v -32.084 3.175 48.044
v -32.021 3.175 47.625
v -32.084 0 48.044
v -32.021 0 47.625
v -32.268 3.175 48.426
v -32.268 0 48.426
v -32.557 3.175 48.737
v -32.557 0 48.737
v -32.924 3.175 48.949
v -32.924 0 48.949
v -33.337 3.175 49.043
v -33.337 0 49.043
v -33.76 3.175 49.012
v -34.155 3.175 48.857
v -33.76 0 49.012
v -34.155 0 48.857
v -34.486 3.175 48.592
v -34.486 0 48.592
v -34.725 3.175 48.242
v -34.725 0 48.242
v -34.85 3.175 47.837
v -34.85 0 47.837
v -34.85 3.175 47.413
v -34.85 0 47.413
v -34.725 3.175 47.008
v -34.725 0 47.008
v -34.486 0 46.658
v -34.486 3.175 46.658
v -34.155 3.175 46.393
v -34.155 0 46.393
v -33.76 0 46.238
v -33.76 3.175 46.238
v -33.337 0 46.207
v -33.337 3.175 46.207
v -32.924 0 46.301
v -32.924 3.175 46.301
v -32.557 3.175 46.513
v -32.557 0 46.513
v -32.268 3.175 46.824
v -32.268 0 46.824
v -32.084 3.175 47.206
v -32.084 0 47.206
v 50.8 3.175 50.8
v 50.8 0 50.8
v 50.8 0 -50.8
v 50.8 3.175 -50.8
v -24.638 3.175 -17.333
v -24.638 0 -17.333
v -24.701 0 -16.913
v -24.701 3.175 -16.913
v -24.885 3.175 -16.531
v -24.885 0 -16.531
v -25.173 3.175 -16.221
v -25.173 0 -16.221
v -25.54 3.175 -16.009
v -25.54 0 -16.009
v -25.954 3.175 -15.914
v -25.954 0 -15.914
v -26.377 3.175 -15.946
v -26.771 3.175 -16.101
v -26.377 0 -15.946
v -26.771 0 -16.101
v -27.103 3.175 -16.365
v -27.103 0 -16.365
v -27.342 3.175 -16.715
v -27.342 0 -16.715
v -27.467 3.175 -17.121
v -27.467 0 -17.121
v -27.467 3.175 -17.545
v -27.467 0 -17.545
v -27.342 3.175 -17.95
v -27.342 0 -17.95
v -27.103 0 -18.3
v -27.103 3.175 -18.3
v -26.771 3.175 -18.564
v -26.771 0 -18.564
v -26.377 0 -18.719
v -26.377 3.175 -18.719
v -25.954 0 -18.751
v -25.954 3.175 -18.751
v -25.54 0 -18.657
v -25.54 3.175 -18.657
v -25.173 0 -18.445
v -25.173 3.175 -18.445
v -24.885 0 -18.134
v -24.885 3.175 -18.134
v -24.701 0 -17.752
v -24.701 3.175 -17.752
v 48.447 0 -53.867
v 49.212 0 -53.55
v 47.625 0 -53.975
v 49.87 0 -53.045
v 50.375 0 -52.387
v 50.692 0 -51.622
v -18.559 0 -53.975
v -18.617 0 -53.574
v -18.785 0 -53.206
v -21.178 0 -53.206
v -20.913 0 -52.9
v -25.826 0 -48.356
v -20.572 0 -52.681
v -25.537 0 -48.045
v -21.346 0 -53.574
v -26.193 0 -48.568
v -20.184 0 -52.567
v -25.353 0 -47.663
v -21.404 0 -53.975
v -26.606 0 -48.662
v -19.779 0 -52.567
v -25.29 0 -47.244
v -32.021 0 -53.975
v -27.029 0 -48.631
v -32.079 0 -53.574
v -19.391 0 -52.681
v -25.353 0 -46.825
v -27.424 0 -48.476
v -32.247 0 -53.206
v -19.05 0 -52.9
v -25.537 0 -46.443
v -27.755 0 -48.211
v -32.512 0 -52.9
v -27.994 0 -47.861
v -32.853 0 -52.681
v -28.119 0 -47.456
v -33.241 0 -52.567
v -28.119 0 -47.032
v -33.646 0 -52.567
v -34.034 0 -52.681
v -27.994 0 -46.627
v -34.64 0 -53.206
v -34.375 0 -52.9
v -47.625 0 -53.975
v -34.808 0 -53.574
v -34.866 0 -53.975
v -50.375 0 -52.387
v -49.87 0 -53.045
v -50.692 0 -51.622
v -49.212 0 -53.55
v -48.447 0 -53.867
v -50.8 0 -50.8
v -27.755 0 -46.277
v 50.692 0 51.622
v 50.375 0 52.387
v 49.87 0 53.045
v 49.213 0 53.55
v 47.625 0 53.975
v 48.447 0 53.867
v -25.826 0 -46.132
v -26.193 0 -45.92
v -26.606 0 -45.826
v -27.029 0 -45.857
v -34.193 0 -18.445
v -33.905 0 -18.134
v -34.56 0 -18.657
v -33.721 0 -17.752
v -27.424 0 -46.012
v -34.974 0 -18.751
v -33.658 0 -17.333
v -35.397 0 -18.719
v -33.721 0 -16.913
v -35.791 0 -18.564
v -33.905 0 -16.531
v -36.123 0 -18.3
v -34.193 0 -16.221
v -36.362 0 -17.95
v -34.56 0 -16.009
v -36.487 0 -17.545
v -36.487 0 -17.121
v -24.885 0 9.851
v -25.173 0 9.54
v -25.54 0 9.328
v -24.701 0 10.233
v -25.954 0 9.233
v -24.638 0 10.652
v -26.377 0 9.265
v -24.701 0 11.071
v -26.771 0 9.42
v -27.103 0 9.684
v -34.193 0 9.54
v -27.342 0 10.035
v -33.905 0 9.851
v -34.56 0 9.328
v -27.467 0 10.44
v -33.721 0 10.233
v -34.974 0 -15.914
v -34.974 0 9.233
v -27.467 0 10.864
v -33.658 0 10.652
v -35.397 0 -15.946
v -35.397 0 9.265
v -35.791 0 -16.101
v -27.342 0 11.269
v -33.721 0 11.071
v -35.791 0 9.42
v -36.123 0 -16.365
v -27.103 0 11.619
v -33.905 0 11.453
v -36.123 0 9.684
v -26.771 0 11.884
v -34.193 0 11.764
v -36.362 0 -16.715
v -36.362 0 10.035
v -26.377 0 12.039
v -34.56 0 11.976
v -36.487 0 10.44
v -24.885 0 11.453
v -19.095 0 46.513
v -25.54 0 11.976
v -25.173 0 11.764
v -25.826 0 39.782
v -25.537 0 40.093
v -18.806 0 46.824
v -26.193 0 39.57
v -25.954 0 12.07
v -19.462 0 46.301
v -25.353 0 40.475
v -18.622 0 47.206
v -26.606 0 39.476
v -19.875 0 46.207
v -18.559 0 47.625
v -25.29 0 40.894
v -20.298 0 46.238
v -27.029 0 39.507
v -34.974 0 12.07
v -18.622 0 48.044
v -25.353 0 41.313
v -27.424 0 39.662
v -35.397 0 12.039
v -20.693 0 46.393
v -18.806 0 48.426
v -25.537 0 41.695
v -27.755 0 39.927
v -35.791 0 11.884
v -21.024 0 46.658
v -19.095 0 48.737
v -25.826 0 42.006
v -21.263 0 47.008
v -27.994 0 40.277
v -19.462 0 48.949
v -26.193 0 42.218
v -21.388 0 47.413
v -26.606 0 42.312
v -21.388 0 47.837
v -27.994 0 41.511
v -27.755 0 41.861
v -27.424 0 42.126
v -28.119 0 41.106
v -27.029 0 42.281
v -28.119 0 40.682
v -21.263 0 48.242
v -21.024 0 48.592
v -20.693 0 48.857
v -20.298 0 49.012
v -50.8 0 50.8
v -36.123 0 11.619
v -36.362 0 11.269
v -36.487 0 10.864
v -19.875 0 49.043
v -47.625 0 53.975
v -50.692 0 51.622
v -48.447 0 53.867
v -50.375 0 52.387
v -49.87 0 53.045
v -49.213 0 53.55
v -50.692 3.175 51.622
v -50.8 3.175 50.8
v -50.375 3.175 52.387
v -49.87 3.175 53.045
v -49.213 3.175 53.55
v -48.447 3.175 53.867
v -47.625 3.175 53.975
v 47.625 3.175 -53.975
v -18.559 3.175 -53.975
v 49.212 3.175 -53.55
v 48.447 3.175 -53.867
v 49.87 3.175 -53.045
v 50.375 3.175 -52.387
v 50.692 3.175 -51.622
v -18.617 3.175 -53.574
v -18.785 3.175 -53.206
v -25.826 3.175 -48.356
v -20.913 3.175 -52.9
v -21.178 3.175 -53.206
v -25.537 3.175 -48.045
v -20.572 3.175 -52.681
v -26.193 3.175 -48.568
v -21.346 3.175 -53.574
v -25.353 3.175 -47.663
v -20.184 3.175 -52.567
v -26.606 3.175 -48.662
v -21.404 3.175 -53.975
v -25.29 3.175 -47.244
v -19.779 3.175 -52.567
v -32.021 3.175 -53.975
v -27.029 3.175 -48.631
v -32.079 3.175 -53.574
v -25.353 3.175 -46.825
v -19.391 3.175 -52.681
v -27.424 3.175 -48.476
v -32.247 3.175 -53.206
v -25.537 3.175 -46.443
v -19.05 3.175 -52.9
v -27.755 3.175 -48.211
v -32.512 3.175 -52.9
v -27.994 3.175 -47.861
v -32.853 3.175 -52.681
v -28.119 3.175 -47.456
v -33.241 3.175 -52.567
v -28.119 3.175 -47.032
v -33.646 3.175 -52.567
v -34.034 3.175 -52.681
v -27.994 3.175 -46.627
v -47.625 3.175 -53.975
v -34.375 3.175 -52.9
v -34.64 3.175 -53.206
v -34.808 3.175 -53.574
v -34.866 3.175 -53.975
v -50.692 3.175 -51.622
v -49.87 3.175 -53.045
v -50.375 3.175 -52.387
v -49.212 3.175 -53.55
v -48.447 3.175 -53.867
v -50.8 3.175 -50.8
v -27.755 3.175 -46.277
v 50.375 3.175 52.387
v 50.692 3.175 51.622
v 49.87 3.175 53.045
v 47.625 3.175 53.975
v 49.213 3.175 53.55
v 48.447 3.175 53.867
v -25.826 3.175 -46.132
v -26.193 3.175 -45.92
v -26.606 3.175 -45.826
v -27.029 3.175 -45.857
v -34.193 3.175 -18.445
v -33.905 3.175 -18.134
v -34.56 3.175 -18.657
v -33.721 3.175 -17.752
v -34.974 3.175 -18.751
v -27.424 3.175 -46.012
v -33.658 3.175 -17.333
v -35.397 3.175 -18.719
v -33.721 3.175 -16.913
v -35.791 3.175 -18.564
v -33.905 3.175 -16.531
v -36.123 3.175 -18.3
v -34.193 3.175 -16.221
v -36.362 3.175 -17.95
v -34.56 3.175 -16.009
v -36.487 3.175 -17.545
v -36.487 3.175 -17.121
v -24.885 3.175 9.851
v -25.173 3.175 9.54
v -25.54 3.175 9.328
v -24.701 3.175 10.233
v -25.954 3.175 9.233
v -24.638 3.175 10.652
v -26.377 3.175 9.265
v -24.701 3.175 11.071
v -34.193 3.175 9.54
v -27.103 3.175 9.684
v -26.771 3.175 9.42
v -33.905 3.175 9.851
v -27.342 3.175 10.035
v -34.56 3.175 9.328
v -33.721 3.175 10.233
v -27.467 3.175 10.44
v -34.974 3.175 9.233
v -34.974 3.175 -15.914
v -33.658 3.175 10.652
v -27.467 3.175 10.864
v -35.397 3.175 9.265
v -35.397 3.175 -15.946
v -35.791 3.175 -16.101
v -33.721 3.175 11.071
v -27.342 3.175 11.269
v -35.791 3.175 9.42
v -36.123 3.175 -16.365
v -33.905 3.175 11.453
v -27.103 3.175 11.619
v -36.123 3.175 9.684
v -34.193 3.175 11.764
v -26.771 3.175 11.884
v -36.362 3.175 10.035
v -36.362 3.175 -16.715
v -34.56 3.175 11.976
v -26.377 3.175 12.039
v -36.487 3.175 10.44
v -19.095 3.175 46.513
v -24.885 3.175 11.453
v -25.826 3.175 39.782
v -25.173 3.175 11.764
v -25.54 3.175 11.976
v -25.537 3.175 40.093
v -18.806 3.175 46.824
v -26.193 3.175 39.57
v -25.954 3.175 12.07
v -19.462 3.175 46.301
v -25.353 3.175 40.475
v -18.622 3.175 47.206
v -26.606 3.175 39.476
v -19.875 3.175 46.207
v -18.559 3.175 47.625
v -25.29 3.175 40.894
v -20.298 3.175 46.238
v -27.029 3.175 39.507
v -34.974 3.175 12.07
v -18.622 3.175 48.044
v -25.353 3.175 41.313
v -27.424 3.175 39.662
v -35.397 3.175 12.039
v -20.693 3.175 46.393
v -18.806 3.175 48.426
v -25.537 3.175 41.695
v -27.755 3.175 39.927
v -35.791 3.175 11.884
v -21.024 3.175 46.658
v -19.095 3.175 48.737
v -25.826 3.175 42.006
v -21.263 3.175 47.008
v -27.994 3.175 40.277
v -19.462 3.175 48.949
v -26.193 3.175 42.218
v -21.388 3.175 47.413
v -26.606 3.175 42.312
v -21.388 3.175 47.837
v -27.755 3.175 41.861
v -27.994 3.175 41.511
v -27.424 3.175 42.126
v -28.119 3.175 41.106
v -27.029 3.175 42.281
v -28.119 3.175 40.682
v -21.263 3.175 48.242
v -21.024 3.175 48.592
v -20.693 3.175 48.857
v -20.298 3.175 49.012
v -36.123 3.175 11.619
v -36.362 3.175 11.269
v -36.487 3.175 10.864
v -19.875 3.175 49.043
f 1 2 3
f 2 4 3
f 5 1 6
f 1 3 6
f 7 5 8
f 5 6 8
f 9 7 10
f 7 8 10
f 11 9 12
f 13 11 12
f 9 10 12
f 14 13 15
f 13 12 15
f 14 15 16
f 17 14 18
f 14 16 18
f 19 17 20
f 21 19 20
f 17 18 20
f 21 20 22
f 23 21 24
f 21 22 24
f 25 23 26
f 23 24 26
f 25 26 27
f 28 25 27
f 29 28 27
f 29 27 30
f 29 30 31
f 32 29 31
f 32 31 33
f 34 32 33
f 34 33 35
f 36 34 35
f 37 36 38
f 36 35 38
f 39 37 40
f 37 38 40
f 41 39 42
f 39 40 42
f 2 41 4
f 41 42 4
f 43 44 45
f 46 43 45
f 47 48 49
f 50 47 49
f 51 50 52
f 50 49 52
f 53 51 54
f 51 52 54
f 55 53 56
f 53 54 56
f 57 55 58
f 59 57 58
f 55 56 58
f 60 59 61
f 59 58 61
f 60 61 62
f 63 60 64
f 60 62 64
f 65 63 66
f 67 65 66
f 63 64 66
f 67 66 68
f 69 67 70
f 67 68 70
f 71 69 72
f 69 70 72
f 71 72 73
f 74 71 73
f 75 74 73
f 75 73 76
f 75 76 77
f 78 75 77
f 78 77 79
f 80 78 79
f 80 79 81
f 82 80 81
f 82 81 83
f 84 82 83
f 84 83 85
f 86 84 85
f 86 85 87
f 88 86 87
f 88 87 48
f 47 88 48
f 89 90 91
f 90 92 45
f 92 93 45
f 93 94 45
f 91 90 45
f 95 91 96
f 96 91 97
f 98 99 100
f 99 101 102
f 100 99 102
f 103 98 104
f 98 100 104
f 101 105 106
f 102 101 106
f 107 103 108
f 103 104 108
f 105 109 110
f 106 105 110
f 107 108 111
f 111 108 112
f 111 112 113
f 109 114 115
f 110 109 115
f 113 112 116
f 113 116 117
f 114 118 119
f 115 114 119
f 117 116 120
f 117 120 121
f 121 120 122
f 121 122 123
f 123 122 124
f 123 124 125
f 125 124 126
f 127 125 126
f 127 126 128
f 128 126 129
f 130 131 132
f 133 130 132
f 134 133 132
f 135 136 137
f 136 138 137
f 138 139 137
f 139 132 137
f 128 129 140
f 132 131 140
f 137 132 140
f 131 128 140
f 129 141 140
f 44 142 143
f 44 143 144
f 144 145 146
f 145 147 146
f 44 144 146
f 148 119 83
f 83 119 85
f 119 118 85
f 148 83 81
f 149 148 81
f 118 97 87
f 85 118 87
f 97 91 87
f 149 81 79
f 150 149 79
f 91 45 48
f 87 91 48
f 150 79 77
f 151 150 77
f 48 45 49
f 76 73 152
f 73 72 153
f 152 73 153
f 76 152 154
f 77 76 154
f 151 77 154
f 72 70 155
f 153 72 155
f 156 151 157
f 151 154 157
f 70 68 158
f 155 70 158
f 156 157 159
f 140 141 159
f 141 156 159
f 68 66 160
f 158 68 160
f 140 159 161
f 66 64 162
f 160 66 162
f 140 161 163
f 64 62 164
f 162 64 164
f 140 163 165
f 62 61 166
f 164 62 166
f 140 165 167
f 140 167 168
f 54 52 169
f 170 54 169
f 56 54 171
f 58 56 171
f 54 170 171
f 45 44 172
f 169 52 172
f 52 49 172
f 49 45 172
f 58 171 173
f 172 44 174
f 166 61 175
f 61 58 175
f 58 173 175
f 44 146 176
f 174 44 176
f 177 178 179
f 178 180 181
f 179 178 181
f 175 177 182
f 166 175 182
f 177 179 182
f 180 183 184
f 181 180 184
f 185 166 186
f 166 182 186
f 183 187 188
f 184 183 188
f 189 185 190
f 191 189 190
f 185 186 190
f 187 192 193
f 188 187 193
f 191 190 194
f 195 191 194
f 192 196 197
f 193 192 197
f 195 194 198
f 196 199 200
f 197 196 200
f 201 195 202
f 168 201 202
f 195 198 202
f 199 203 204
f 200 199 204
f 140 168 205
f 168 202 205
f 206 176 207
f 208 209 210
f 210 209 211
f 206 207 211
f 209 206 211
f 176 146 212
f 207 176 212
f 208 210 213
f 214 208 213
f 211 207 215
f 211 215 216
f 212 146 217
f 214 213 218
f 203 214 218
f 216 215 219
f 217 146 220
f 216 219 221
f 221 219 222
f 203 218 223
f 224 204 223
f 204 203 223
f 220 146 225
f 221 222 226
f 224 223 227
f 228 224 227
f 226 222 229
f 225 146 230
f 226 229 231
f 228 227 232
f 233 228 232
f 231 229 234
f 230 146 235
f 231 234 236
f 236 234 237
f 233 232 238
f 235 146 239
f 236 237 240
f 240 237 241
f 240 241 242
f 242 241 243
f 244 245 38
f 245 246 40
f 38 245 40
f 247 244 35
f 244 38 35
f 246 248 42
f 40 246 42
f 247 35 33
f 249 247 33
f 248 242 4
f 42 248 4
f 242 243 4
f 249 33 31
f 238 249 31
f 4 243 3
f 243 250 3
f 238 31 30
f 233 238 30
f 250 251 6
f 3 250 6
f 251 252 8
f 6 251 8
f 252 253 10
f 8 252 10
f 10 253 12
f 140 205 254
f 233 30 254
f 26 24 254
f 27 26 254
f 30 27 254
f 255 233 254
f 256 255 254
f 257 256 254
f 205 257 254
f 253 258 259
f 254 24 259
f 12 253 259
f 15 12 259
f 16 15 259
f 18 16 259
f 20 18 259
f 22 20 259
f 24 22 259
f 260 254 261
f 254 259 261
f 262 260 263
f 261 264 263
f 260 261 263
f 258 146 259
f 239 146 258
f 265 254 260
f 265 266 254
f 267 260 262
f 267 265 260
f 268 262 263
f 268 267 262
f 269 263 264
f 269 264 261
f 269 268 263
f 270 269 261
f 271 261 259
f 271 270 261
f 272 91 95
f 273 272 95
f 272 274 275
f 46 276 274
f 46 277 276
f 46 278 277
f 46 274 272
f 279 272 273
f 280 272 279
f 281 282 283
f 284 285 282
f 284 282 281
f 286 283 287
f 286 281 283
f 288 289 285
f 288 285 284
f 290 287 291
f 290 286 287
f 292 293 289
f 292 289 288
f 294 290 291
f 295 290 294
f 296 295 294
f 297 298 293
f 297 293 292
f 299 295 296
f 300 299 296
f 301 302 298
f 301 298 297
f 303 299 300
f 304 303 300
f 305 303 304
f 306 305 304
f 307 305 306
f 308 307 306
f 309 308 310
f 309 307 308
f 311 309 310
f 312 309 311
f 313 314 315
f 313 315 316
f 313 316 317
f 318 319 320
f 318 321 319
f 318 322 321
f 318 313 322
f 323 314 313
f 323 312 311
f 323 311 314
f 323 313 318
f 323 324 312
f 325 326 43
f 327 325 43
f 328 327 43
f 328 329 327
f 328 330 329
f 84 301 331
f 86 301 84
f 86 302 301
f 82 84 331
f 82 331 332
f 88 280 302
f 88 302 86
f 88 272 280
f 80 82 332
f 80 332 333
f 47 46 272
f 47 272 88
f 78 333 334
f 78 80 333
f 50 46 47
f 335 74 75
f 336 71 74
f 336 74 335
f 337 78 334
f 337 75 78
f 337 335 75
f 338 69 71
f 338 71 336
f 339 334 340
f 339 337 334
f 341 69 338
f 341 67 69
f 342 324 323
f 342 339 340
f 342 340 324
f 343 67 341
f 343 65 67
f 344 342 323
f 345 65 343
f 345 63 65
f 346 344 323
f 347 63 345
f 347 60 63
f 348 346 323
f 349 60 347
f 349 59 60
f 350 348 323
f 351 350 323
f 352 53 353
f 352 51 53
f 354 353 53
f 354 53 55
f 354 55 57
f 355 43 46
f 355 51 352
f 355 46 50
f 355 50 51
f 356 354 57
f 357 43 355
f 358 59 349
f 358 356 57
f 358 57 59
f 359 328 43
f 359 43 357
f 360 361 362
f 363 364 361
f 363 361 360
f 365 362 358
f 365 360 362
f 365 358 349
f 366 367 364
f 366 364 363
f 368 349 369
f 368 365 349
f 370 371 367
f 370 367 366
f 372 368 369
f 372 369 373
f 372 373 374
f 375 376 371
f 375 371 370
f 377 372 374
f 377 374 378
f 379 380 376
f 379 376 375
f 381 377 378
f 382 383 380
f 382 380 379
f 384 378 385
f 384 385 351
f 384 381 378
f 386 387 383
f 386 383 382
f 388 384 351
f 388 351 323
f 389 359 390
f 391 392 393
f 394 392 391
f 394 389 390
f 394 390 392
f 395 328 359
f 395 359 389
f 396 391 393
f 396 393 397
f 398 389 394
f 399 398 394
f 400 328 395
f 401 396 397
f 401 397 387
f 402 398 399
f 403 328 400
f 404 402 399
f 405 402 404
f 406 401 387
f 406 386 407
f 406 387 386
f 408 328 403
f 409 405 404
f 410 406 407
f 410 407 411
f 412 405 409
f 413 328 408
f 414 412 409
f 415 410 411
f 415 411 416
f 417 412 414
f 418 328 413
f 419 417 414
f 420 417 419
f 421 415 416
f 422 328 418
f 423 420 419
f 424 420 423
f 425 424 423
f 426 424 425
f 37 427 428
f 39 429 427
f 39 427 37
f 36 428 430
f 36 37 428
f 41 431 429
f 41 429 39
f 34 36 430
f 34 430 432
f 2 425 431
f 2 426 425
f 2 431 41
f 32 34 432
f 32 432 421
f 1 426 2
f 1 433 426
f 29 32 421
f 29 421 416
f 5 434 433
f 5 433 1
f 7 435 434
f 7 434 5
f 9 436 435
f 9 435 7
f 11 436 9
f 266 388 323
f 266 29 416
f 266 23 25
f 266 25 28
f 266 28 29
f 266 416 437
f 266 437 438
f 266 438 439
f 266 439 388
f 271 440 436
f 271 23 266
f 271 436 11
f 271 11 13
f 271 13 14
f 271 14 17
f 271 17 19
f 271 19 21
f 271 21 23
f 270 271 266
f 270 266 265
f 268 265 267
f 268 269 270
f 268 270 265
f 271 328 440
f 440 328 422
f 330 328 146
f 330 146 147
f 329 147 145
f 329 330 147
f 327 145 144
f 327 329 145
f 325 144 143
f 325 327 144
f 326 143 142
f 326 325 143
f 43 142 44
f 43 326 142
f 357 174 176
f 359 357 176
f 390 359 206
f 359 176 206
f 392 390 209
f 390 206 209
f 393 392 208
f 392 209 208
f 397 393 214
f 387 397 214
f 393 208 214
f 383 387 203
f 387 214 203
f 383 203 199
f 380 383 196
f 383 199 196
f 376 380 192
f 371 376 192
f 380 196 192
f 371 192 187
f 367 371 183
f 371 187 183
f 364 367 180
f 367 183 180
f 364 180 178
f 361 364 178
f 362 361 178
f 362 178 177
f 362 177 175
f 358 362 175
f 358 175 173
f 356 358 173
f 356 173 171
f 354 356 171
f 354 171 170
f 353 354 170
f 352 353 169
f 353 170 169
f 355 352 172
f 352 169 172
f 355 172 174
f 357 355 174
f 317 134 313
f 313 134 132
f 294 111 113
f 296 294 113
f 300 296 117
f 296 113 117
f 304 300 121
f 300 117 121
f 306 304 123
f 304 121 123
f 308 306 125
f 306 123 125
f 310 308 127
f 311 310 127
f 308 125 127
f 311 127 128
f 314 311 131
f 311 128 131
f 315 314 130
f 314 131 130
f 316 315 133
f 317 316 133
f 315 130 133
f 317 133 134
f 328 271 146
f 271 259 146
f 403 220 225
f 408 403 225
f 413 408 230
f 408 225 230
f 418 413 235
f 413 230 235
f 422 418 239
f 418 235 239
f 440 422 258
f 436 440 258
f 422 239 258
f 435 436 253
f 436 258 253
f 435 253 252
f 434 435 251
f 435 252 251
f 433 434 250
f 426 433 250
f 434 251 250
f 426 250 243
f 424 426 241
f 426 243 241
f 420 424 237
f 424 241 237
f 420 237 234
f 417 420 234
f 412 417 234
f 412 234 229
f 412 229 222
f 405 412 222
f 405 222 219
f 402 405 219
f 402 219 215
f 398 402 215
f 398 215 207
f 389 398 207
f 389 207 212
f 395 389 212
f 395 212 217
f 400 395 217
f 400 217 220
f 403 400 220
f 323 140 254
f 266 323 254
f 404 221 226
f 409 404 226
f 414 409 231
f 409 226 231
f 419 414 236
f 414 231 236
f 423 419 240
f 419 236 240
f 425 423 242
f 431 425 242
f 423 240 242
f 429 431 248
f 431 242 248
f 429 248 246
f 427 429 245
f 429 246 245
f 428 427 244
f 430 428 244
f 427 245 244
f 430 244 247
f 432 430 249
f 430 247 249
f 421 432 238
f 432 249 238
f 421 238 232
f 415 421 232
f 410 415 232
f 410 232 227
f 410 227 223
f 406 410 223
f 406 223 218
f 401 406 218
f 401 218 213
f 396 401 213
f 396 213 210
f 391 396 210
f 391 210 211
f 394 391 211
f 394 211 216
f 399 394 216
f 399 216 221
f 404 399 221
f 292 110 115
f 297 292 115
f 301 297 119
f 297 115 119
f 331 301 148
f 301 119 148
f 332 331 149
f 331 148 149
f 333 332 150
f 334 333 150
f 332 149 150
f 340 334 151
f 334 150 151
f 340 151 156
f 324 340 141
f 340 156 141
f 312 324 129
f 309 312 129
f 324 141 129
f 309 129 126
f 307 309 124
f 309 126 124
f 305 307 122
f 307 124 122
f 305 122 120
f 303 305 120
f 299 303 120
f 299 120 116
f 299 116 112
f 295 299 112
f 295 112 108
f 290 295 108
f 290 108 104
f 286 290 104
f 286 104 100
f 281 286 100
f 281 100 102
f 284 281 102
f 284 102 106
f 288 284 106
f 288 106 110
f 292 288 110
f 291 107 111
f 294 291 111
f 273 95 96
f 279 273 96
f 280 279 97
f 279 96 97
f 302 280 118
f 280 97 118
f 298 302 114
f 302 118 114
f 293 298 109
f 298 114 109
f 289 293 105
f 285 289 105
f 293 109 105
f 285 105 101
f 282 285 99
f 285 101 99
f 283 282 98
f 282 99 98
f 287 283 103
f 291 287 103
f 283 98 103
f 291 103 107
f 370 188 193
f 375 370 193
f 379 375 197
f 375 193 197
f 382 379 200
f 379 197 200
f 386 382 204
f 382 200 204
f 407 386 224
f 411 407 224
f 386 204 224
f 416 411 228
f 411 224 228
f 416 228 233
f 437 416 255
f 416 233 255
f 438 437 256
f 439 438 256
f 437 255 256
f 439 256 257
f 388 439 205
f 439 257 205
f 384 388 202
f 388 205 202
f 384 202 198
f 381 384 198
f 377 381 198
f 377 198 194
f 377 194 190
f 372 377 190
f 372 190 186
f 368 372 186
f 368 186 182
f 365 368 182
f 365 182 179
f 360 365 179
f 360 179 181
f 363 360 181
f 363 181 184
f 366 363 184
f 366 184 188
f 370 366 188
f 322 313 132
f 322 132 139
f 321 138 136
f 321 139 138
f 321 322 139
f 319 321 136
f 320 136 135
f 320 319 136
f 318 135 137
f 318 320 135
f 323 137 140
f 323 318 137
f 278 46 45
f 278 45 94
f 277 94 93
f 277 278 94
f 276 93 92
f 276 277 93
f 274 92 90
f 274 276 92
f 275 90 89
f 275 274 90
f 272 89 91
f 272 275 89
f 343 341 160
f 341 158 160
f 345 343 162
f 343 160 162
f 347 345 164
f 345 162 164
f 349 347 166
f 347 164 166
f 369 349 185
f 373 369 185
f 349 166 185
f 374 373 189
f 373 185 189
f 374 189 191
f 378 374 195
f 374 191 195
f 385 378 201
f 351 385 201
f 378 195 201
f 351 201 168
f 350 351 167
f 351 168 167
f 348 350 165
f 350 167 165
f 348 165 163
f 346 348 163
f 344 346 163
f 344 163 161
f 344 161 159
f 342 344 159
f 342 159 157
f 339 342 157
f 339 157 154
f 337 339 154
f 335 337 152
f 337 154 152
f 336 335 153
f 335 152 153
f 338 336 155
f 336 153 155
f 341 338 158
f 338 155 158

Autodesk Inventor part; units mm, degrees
ref_plane "YZ Plane" through (0, 0, 0) normal (1, 0, 0) x (0, 1, 0)
ref_plane "XZ Plane" through (0, 0, 0) normal (0, 1, 0) x (-1, 0, 0)
ref_plane "XY Plane" through (0, 0, 0) normal (0, 0, 1) x (1, 0, 0)
sketch "Sketch1" plane through (0, 0, 0) normal (0, 1, 0) x (-1, 0, 0)
  line L0 (50.8, 53.975) -> (-50.8, 53.975)
  line L1 (-50.8, 53.975) -> (-50.8, -53.975)
  line L2 (-50.8, -53.975) -> (50.8, -53.975)
  line L3 (50.8, -53.975) -> (50.8, 53.975)
  point P0 (0, 0)
  dimension "d0" = 107.95
  dimension "d1" = 101.6
  dimension "d2" = 50.8
  dimension "d3" = 53.975
extrude "Extrusion1" add sketch "Sketch1" along normal blind 3.175
sketch "Sketch4" plane through (0, 3.175, 0) normal (0, 1, 0) x (1, 0, 0)
  circle A0 centre (44.45, 47.625) radius 3.175
  circle A1 centre (44.45, -47.625) radius 3.175
  circle A2 centre (-41.91, -29.845) radius 3.175
  line L0 (50.8, 53.975) -> (-50.8, 53.975) projected
  line L1 (50.8, -53.975) -> (50.8, 53.975) projected
  line L2 (-50.8, -53.975) -> (50.8, -53.975) projected
  line L3 (-50.8, 53.975) -> (-50.8, -53.975) projected
  circle A3 centre (-41.91, 29.845) radius 3.175
  point P0 (0, 0)
  dimension "d20" = 6.35
  dimension "d21" = 6.35
  dimension "d22" = 6.35
  dimension "d23" = 6.35
  dimension "d24" = 6.35
  dimension "d25" = 6.35
  dimension "d26" = 6.35
  dimension "d27" = 24.13
  dimension "d28" = 8.89
  dimension "d32" = 6.35
  dimension "d33" = 24.13
  dimension "d34" = 8.89
extrude "Extrusion6" [suppressed]
fillet "Fillet1" radius 3.175 4 edges at (-50.8, 1.5875, 53.975) (50.8, 1.5875, 53.975) (50.8, 1.5875, -53.975) (-50.8, 1.5875, -53.975)
sketch "Sketch6" plane through (0, 0, 0) normal (0, -1, 0) x (1, 0, 0)
  circle A0 centre (-33.4435, 47.625) radius 1.4224 projected
  circle A1 centre (-26.7125, 40.894) radius 1.4224 projected
  line L0 (-26.7125, -40.3479) -> (-12.425, -40.3479)
  circle A2 centre (-19.9815, 47.625) radius 1.4224 projected
  circle A3 centre (-35.08, 10.6518) radius 1.4224 projected
  circle A4 centre (-26.06, 10.6518) radius 1.4224 projected
  circle A5 centre (-35.08, -17.3326) radius 1.4224 projected
  circle A6 centre (-26.06, -17.3326) radius 1.4224 projected
  circle A7 centre (-33.4435, -53.975) radius 1.4224 projected
  circle A8 centre (-26.7125, -47.244) radius 1.4224 projected
  circle A9 centre (-19.9815, -53.975) radius 1.4224 projected
  point P0 (0, 0)
extrude "Extrusion7" cut sketch "Sketch6" against normal through all
equation "\"d2\" = 0.5 * d1"
equation "\"d3\" = 0.5 * d0"
equation "\"d21\" = d20"
equation "\"d22\" = d20"
equation "\"d24\" = d23"
equation "\"d25\" = d24"
equation "\"d26\" = d23"
equation "\"d32\" = d20"
equation "\"d33\" = d27"
equation "\"d34\" = d28"
properties part number "Base plate" material "Aluminum 6061"
